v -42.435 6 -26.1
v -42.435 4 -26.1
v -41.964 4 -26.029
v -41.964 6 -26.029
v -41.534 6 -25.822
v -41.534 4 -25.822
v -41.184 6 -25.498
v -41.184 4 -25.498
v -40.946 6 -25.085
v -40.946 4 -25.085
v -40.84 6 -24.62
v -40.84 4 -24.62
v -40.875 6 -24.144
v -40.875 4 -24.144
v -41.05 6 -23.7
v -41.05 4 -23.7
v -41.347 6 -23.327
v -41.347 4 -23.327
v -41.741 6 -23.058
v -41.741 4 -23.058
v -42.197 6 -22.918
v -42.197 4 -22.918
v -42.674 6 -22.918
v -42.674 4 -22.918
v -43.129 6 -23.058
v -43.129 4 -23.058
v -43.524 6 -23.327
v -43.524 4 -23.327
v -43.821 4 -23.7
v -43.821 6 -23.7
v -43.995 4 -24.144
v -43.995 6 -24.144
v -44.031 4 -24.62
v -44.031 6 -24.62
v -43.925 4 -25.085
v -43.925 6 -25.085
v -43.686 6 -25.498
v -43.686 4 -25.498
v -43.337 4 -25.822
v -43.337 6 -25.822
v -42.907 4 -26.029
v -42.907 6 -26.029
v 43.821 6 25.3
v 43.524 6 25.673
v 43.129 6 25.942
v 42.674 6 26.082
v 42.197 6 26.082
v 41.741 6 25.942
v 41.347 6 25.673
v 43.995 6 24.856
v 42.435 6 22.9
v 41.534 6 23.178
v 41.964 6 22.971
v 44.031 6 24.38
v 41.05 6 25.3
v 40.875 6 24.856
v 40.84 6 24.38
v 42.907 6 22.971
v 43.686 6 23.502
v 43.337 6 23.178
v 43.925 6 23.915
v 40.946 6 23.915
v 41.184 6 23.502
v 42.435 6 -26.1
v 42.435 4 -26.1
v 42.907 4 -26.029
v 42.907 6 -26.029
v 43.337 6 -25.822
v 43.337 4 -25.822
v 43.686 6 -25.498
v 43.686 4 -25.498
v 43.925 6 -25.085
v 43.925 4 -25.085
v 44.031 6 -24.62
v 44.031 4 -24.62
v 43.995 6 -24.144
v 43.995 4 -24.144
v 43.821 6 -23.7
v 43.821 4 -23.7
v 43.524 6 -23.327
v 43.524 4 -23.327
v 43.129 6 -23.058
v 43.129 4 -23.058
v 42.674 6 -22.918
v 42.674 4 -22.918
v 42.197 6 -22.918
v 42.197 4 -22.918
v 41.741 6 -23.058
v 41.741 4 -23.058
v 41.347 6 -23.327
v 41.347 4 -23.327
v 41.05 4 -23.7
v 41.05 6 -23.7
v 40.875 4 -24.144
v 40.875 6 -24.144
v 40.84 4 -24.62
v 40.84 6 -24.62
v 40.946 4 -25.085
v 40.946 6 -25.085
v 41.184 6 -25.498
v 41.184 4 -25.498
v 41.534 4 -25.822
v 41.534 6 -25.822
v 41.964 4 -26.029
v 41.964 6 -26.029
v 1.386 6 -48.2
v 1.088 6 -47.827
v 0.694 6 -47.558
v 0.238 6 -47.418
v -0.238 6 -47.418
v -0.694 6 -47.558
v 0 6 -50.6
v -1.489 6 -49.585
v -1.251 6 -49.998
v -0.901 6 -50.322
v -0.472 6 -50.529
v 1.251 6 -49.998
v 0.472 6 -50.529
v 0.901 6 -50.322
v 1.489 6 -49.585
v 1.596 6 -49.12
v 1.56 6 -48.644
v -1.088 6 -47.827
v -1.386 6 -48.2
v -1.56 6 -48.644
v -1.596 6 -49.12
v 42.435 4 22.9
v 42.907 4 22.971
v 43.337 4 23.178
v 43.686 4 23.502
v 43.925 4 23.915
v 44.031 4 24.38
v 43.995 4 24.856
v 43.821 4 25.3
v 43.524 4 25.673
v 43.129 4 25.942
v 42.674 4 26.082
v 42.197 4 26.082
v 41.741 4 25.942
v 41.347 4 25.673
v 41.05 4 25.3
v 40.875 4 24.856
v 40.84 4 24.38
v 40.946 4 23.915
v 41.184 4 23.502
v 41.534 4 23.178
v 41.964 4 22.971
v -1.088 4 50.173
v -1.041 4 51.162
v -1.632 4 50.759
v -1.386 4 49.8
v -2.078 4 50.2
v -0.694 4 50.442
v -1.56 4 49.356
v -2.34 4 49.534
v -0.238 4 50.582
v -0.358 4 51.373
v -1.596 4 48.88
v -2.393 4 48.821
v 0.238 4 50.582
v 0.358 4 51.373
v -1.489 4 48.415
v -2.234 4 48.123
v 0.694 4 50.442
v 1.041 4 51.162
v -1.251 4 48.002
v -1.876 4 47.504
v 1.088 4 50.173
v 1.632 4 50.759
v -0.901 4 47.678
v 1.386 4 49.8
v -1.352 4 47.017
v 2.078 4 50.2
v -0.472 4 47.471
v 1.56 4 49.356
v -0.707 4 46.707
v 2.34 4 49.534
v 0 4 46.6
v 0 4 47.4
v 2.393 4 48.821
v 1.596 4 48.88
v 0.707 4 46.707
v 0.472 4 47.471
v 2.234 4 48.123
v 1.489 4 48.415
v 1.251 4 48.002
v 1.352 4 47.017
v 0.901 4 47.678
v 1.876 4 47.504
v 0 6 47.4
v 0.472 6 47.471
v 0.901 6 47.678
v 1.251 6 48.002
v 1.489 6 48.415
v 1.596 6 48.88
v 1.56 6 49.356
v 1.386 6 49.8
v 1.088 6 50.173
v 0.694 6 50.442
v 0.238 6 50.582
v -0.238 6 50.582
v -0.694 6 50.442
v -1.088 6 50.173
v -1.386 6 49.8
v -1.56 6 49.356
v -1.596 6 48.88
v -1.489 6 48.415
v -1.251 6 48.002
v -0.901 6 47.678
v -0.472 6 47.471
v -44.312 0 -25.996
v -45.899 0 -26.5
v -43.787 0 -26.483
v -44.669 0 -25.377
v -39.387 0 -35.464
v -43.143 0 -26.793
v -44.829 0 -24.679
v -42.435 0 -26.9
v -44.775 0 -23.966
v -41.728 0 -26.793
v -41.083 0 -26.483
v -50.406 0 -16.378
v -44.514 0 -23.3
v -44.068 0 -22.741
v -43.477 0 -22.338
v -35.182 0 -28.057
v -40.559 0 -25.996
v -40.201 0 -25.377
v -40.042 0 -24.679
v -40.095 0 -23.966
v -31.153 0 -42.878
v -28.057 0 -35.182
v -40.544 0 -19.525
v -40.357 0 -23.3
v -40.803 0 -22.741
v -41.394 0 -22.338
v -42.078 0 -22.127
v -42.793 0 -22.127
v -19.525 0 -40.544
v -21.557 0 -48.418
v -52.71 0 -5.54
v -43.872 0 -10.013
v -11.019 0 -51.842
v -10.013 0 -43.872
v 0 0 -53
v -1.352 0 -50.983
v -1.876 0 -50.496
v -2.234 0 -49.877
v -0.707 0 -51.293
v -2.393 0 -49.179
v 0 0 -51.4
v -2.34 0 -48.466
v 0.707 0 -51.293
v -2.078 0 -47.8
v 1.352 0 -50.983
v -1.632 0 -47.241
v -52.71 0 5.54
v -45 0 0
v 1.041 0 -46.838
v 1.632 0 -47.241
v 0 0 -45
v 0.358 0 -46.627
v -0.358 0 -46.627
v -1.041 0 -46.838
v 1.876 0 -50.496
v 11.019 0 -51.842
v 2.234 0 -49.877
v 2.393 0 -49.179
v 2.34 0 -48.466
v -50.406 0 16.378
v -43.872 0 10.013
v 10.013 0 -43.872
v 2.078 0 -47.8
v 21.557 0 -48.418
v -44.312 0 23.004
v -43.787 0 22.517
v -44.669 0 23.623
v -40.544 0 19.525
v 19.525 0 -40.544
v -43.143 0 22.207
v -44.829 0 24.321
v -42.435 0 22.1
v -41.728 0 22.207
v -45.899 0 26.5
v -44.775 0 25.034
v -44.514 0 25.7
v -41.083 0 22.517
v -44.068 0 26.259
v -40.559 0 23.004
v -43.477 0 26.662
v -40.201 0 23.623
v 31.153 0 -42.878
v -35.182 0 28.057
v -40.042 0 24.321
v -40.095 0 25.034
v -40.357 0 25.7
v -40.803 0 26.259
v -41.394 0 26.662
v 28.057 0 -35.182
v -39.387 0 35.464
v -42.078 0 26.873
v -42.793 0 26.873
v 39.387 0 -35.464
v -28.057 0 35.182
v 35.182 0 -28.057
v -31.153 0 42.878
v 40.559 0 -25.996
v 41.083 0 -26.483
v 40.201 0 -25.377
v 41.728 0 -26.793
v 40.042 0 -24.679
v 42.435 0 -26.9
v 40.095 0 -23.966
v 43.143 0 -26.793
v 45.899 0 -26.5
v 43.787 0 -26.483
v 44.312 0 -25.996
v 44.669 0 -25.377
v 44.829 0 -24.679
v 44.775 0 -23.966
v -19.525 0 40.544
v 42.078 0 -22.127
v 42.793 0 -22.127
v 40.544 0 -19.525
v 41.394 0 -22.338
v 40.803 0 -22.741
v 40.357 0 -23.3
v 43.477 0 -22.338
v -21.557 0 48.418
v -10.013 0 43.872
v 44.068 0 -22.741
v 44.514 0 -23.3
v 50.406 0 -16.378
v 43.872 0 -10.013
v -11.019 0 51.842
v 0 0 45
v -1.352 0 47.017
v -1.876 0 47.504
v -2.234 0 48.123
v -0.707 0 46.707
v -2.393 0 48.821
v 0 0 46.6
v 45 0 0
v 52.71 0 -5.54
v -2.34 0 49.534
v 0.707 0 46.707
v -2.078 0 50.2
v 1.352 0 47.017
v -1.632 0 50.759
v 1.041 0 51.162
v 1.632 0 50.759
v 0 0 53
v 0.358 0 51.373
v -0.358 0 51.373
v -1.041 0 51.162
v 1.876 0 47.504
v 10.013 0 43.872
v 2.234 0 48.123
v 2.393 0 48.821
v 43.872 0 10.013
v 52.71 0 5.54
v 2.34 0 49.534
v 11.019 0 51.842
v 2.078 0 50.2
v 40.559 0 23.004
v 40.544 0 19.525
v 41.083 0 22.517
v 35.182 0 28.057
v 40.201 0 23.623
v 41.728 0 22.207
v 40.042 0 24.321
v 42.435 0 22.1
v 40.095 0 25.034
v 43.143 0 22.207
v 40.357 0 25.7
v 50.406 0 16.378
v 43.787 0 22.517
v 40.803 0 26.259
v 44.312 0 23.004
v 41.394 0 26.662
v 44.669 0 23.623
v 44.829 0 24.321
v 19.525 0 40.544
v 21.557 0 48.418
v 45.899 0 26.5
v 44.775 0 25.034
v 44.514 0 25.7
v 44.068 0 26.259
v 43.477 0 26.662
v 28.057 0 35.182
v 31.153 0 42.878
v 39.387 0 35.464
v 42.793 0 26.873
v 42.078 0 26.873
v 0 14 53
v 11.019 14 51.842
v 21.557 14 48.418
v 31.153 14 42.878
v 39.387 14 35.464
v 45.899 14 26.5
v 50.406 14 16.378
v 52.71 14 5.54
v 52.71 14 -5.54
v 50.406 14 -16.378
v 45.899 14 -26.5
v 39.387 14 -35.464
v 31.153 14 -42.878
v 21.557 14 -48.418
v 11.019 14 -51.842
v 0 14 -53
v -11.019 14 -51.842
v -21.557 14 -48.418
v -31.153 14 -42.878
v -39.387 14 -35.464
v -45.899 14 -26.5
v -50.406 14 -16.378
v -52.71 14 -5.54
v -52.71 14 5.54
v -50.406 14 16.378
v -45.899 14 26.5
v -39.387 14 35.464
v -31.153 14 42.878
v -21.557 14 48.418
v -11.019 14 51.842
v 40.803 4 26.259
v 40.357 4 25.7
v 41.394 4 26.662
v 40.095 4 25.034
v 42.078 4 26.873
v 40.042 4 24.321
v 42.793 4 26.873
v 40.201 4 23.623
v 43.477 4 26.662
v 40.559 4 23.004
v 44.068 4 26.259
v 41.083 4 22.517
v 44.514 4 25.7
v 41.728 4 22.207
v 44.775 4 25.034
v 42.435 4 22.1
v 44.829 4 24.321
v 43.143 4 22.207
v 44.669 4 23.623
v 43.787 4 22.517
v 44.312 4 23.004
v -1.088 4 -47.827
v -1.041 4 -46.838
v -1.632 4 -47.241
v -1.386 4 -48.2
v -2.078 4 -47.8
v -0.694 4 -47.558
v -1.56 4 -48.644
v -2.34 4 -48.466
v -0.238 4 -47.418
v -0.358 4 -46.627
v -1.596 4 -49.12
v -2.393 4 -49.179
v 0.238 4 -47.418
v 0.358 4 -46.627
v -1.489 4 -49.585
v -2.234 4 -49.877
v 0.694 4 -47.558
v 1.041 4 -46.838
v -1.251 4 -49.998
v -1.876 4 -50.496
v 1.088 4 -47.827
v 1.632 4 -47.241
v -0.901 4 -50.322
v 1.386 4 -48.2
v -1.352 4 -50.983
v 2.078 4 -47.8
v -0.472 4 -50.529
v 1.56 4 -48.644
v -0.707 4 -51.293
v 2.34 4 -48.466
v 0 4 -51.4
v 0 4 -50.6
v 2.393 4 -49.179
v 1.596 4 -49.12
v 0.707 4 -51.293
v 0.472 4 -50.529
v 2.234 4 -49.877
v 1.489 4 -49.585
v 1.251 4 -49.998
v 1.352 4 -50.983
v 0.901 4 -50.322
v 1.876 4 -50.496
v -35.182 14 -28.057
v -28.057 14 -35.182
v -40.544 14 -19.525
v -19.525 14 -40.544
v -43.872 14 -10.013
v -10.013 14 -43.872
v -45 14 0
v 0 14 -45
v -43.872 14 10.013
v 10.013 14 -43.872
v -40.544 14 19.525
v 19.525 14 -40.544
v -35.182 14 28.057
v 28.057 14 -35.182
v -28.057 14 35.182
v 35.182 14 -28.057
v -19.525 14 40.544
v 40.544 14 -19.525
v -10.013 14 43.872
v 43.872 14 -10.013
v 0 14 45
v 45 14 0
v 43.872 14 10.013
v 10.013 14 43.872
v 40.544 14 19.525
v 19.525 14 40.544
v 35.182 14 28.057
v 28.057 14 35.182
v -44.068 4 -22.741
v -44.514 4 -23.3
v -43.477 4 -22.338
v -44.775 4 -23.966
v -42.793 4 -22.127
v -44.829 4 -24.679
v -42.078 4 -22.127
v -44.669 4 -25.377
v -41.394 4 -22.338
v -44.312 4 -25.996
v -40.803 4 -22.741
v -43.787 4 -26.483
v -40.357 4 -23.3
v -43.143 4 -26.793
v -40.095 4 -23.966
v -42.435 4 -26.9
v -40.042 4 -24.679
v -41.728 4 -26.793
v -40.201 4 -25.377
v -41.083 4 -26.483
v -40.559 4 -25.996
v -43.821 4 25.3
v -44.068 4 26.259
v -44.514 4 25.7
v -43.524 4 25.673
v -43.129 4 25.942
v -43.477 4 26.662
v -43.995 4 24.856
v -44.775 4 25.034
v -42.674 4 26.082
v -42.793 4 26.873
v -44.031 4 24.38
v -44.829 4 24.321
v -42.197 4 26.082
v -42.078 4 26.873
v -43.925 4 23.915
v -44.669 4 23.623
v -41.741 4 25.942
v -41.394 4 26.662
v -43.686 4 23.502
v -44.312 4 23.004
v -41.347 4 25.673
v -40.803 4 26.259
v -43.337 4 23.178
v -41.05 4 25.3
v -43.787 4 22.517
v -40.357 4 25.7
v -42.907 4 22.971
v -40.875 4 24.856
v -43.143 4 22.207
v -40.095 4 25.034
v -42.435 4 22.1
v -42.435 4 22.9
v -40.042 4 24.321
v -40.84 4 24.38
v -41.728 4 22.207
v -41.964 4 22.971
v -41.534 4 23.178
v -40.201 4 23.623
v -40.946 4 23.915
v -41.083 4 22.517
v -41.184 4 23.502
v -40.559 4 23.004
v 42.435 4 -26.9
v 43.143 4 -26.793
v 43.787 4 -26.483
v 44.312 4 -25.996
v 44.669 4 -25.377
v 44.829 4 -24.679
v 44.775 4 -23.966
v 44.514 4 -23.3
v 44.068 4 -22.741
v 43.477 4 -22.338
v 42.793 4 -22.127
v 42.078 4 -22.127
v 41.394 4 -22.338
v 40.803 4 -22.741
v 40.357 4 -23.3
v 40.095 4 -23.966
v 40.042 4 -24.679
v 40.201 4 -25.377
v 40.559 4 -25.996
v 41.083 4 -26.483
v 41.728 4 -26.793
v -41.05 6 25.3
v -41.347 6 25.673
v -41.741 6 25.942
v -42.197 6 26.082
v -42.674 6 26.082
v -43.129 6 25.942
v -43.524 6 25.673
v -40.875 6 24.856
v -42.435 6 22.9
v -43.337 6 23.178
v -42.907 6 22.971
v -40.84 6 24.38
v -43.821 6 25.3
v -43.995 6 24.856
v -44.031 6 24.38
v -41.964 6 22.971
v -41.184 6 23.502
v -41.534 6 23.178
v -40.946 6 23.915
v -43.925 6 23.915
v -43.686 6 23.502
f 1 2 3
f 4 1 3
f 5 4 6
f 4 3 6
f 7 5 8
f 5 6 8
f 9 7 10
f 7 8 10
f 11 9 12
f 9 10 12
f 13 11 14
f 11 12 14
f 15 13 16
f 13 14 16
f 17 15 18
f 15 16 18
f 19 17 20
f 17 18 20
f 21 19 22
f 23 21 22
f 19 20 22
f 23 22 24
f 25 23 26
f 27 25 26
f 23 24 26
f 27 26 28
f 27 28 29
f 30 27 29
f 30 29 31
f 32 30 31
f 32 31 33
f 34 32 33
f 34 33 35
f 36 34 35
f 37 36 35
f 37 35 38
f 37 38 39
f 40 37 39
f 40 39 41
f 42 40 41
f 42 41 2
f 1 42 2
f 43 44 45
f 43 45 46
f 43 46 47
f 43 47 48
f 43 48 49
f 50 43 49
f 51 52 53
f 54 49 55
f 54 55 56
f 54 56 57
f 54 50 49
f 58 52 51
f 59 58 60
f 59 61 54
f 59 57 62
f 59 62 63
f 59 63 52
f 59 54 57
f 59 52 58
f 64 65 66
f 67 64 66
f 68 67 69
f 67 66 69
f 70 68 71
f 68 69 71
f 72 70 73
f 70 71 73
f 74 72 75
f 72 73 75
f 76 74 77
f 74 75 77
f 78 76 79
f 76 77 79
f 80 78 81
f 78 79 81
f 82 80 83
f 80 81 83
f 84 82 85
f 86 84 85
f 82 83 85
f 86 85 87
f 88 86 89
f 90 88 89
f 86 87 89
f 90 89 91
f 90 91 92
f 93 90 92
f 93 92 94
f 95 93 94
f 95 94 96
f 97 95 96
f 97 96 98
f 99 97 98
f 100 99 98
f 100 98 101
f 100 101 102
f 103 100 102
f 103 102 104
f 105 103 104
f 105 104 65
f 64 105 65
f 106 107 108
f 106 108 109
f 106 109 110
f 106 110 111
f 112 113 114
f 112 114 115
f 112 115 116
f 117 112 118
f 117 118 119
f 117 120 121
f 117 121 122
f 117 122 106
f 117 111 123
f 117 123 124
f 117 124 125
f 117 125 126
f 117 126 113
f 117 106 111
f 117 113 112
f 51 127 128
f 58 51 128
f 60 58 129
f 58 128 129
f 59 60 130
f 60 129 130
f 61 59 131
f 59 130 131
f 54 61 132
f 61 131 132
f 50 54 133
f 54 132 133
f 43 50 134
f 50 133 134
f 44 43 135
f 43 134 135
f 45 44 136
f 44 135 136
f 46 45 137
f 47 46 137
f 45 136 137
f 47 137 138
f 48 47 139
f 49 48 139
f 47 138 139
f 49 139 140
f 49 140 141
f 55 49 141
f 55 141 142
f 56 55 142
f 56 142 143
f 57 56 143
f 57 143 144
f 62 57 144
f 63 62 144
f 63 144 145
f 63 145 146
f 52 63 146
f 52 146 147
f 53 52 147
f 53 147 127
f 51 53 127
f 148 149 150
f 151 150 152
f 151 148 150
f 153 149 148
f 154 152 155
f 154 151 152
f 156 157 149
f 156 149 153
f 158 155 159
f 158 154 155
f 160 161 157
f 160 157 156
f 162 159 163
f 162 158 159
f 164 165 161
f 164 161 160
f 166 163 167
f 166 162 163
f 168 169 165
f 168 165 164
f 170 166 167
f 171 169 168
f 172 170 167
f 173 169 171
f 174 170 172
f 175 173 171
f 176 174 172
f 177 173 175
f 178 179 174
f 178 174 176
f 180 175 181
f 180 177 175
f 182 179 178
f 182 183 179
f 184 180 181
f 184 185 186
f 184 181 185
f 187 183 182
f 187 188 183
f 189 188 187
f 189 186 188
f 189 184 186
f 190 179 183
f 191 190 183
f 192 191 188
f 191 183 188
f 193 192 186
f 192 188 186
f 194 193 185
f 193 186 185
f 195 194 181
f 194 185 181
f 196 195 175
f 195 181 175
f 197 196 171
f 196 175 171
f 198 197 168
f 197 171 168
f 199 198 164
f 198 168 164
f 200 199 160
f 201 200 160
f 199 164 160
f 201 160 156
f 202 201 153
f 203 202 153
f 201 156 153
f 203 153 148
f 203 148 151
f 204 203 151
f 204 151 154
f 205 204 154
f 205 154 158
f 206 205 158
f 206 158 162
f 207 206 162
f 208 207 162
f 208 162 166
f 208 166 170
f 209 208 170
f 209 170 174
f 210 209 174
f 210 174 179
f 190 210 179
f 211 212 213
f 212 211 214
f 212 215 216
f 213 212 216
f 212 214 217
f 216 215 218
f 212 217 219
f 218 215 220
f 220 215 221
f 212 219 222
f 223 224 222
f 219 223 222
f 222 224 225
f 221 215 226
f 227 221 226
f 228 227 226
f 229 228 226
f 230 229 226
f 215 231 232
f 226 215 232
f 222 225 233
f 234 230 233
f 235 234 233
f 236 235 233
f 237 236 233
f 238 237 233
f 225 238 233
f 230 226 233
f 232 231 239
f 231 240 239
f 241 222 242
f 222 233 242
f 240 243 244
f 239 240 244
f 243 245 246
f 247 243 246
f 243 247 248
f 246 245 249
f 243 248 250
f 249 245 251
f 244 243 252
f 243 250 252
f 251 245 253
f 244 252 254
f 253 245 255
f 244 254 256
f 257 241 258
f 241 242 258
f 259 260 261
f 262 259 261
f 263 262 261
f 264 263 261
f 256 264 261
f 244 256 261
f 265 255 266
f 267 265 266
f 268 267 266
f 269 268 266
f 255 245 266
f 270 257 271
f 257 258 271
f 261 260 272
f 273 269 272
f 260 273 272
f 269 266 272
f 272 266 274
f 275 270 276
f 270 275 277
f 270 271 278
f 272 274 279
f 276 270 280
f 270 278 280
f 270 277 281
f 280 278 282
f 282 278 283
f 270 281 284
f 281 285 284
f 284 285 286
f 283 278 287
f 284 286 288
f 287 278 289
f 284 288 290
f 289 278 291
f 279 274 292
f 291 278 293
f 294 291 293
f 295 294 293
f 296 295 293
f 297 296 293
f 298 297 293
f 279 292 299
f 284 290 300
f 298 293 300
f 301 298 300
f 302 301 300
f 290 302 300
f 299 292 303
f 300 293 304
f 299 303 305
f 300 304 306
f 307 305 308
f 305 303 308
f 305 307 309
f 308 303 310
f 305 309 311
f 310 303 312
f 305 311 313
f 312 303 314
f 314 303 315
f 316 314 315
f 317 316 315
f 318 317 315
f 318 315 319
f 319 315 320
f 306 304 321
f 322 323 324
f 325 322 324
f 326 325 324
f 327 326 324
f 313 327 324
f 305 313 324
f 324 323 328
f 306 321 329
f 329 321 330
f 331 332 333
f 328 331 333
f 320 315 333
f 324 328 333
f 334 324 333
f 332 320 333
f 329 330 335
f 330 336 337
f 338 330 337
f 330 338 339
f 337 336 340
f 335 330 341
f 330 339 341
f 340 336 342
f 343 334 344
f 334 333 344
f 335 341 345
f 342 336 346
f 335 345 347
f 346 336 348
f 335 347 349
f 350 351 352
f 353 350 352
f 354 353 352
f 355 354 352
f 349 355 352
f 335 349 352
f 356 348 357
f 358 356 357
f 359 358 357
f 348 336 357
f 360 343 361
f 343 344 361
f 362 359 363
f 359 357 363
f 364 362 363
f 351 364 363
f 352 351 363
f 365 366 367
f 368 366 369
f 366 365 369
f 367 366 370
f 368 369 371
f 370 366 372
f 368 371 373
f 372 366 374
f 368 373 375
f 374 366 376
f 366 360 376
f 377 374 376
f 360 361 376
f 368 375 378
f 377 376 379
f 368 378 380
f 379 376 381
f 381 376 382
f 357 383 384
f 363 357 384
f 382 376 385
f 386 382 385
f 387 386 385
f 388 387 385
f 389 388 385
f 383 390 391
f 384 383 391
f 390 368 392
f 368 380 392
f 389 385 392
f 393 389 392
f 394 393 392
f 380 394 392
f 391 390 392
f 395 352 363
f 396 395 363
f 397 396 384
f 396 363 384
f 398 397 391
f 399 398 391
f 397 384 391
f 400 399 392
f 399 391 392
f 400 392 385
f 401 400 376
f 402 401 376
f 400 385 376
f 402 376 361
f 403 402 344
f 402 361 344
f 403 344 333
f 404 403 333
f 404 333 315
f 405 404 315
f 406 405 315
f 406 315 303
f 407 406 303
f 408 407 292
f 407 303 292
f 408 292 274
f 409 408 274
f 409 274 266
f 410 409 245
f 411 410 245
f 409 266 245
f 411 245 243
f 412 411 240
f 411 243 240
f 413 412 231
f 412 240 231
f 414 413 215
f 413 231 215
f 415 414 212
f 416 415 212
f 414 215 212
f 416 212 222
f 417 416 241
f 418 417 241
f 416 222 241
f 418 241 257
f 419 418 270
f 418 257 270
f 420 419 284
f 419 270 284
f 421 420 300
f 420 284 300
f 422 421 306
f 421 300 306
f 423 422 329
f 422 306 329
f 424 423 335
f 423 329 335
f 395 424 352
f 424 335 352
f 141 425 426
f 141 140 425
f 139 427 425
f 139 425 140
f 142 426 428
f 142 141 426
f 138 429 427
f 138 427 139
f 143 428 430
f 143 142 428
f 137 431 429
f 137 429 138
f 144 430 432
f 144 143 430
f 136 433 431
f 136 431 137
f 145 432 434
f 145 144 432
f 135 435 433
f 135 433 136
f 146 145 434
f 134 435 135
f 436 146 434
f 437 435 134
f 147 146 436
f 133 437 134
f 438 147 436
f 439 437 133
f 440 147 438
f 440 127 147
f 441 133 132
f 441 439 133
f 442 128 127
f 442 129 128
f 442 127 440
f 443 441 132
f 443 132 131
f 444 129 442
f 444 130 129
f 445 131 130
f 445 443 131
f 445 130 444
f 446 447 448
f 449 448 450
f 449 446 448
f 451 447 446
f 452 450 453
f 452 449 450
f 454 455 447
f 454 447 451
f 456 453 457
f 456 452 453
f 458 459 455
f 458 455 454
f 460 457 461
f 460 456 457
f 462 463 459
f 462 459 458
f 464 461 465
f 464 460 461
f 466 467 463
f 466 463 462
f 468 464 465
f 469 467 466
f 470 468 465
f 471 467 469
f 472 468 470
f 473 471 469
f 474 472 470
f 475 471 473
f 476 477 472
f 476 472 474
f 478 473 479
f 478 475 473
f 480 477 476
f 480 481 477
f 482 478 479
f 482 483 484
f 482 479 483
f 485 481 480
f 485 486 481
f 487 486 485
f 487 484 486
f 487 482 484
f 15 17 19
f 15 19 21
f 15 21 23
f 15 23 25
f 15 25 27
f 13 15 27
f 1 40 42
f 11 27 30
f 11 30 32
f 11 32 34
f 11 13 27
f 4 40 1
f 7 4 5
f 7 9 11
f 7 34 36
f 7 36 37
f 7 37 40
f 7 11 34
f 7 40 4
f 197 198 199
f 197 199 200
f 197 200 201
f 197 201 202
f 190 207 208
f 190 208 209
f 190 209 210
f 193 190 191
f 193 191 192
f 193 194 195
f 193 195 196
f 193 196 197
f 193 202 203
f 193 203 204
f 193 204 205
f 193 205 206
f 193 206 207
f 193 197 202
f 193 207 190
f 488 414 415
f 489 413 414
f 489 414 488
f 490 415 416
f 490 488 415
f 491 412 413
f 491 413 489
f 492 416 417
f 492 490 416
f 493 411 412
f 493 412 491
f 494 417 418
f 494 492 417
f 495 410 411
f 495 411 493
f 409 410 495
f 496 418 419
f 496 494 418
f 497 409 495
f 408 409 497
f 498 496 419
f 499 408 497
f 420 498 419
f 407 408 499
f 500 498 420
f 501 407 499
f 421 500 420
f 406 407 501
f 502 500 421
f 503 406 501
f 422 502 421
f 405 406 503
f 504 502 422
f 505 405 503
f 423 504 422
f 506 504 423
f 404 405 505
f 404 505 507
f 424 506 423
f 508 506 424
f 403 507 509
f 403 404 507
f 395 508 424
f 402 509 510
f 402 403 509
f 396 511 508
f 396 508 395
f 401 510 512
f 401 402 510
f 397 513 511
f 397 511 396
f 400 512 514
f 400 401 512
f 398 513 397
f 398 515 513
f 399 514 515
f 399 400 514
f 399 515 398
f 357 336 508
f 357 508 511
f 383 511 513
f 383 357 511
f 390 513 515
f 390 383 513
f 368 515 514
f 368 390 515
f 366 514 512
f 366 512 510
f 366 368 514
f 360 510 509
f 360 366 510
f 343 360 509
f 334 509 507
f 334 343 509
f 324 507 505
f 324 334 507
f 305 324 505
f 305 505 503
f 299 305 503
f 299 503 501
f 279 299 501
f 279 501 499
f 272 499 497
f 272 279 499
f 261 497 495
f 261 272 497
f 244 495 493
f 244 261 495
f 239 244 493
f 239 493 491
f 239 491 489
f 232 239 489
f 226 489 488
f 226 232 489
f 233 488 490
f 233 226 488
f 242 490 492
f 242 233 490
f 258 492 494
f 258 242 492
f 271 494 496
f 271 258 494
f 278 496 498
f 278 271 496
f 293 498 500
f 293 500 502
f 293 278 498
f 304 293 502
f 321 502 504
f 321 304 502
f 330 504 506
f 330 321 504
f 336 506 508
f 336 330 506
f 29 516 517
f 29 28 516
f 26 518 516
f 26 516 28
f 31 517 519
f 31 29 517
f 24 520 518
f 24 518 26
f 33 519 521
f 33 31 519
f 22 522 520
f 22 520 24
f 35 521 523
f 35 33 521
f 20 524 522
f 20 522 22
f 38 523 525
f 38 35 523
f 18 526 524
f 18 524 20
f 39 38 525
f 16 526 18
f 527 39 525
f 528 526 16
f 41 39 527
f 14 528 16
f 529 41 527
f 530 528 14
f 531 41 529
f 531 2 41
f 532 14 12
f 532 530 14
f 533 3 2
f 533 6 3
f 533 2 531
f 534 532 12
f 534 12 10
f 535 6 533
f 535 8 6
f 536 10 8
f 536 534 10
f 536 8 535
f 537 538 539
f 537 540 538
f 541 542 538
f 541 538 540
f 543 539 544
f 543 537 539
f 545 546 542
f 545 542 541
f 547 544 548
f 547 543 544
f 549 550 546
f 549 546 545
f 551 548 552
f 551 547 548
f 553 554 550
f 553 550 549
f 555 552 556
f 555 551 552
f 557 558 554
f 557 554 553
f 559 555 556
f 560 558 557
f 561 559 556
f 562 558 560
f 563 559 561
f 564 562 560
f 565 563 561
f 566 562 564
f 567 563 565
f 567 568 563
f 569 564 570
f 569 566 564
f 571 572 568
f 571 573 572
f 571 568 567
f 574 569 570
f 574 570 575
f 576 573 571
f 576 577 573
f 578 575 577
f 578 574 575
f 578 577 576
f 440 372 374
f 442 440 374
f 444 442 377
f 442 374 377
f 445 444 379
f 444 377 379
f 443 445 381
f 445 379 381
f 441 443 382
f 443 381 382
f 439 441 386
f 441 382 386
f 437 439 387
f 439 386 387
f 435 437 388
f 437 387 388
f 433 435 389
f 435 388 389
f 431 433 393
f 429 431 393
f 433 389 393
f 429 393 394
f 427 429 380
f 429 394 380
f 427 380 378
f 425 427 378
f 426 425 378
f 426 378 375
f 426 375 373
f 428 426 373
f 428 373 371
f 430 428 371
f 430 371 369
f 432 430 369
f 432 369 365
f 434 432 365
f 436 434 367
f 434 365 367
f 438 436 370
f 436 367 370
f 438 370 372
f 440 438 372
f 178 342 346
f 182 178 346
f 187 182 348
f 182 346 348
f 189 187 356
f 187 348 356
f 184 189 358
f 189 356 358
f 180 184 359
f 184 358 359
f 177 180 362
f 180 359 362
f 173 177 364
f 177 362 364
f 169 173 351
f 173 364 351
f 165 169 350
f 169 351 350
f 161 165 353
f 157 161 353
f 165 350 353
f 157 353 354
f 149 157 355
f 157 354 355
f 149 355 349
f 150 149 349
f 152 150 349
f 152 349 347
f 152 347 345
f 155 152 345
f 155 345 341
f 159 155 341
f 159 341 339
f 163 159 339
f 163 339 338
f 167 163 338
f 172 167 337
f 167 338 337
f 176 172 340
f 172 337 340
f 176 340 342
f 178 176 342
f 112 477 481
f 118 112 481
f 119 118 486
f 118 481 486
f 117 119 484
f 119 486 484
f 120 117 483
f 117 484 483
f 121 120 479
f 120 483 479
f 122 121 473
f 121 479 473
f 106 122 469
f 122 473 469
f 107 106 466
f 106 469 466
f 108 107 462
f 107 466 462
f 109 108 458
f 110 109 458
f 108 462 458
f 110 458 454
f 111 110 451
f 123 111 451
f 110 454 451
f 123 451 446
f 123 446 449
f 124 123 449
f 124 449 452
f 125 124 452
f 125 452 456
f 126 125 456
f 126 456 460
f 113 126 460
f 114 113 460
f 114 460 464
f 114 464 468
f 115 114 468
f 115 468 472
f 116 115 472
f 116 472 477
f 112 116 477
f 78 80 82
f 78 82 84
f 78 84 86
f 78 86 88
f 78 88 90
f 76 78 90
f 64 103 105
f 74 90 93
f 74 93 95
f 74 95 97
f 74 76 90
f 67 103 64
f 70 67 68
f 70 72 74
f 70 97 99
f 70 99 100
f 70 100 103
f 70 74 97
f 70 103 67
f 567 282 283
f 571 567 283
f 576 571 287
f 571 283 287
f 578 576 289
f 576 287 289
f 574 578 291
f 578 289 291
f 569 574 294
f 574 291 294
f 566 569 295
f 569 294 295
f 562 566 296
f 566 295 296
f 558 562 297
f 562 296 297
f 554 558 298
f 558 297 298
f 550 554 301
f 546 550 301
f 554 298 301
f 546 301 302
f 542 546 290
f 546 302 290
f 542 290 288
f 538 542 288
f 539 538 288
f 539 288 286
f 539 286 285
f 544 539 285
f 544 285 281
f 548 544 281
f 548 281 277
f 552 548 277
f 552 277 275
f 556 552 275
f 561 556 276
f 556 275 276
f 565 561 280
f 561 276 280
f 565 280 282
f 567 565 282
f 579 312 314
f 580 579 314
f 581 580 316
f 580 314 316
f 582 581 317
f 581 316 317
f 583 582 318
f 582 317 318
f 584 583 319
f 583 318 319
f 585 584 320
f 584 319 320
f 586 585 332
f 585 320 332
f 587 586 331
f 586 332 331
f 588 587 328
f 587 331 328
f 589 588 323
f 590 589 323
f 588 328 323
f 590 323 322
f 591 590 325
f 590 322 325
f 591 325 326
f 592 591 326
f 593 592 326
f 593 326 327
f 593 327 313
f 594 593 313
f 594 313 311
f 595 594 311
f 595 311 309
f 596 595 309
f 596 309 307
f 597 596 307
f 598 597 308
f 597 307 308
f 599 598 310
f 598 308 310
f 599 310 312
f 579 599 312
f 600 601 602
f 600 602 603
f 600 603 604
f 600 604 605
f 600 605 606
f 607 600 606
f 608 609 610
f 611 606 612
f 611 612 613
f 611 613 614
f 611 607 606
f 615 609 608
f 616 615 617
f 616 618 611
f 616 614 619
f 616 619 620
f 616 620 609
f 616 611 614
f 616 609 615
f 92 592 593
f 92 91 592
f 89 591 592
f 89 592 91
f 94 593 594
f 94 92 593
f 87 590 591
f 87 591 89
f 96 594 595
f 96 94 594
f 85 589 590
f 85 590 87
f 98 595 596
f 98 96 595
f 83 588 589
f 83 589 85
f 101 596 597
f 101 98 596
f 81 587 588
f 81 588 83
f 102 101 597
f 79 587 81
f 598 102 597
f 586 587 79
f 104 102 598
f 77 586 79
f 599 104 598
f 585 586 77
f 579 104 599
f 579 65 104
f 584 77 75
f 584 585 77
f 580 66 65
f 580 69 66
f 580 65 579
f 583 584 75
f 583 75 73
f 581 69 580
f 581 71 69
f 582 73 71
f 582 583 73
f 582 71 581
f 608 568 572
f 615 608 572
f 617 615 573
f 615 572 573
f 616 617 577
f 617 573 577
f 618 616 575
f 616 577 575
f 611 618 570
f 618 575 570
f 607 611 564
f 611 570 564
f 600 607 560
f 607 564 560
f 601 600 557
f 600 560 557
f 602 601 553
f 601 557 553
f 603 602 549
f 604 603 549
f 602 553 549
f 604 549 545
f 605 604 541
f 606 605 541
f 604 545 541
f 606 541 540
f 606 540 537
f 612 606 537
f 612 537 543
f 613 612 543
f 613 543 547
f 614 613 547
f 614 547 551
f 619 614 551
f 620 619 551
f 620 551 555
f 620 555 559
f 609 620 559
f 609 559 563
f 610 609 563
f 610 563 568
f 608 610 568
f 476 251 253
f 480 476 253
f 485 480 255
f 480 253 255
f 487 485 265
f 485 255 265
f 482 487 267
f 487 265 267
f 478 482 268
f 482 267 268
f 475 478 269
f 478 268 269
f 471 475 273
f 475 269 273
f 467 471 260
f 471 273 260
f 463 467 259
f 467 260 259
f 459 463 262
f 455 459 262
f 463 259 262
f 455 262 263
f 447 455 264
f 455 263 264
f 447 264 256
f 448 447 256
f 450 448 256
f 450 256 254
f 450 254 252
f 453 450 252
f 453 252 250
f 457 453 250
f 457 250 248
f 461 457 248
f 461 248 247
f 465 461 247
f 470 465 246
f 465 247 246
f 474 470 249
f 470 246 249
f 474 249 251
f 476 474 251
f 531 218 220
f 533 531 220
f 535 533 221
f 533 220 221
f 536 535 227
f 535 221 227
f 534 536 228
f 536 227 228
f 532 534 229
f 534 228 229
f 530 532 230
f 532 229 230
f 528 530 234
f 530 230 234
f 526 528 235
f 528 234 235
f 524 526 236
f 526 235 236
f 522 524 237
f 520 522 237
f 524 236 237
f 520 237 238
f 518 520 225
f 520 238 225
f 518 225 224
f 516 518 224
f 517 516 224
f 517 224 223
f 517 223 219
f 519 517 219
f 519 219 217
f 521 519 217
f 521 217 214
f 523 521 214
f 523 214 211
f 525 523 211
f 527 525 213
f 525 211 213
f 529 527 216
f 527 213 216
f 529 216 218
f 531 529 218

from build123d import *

# Parameters (mm, degrees)
SKETCH1_R           = 53
SKETCH1_R_2         = 45
BOSS_EXTRUDE1_DEPTH = 14
SKETCH2_R           = 2.4
CUT_EXTRUDE1_DEPTH  = 4
SKETCH3_R           = 1.6
CUT_EXTRUDE2_DEPTH  = 6


with BuildPart() as part:
    # Sketch1 → Boss-Extrude1 (new body)
    with BuildSketch(Plane(origin=(0, 0, 0), x_dir=(1, 0, 0), z_dir=(0, 1, 0))):
        with Locations(Location((0, 0, 0), (0, 0, 270))):
            Circle(SKETCH1_R)
        with Locations(Location((0, 0, 0), (0, 0, 270))):
            Circle(SKETCH1_R_2, mode=Mode.SUBTRACT)
    extrude(amount=BOSS_EXTRUDE1_DEPTH)

    # Sketch2 → Cut-Extrude1 (cut)
    with BuildSketch(Plane.XZ):
        with Locations(Location((0, 49, 0), (0, 0, 270))):
            Circle(SKETCH2_R)
        with Locations(Location((42.435244785, 24.5, 0), (0, 0, 270))):
            Circle(SKETCH2_R)
        with Locations(Location((42.435244785, -24.5, 0), (0, 0, 270))):
            Circle(SKETCH2_R)
        with Locations(Location((0, -49, 0), (0, 0, 270))):
            Circle(SKETCH2_R)
        with Locations(Location((-42.435244785, -24.5, 0), (0, 0, 270))):
            Circle(SKETCH2_R)
        with Locations(Location((-42.435244785, 24.5, 0), (0, 0, 270))):
            Circle(SKETCH2_R)
    extrude(amount=-CUT_EXTRUDE1_DEPTH, mode=Mode.SUBTRACT)

    # Sketch3 → Cut-Extrude2 (cut)
    with BuildSketch(Plane.XZ):
        with Locations(Location((0, 49, 0), (0, 0, 270))):
            Circle(SKETCH3_R)
        with Locations(Location((42.435244785, 24.5, 0), (0, 0, 270))):
            Circle(SKETCH3_R)
        with Locations(Location((42.435244785, -24.5, 0), (0, 0, 270))):
            Circle(SKETCH3_R)
        with Locations(Location((0, -49, 0), (0, 0, 270))):
            Circle(SKETCH3_R)
        with Locations(Location((-42.435244785, 24.5, 0), (0, 0, 270))):
            Circle(SKETCH3_R)
        with Locations(Location((-42.435244785, -24.5, 0), (0, 0, 270))):
            Circle(SKETCH3_R)
    extrude(amount=-CUT_EXTRUDE2_DEPTH, mode=Mode.SUBTRACT)


solid = part.part
